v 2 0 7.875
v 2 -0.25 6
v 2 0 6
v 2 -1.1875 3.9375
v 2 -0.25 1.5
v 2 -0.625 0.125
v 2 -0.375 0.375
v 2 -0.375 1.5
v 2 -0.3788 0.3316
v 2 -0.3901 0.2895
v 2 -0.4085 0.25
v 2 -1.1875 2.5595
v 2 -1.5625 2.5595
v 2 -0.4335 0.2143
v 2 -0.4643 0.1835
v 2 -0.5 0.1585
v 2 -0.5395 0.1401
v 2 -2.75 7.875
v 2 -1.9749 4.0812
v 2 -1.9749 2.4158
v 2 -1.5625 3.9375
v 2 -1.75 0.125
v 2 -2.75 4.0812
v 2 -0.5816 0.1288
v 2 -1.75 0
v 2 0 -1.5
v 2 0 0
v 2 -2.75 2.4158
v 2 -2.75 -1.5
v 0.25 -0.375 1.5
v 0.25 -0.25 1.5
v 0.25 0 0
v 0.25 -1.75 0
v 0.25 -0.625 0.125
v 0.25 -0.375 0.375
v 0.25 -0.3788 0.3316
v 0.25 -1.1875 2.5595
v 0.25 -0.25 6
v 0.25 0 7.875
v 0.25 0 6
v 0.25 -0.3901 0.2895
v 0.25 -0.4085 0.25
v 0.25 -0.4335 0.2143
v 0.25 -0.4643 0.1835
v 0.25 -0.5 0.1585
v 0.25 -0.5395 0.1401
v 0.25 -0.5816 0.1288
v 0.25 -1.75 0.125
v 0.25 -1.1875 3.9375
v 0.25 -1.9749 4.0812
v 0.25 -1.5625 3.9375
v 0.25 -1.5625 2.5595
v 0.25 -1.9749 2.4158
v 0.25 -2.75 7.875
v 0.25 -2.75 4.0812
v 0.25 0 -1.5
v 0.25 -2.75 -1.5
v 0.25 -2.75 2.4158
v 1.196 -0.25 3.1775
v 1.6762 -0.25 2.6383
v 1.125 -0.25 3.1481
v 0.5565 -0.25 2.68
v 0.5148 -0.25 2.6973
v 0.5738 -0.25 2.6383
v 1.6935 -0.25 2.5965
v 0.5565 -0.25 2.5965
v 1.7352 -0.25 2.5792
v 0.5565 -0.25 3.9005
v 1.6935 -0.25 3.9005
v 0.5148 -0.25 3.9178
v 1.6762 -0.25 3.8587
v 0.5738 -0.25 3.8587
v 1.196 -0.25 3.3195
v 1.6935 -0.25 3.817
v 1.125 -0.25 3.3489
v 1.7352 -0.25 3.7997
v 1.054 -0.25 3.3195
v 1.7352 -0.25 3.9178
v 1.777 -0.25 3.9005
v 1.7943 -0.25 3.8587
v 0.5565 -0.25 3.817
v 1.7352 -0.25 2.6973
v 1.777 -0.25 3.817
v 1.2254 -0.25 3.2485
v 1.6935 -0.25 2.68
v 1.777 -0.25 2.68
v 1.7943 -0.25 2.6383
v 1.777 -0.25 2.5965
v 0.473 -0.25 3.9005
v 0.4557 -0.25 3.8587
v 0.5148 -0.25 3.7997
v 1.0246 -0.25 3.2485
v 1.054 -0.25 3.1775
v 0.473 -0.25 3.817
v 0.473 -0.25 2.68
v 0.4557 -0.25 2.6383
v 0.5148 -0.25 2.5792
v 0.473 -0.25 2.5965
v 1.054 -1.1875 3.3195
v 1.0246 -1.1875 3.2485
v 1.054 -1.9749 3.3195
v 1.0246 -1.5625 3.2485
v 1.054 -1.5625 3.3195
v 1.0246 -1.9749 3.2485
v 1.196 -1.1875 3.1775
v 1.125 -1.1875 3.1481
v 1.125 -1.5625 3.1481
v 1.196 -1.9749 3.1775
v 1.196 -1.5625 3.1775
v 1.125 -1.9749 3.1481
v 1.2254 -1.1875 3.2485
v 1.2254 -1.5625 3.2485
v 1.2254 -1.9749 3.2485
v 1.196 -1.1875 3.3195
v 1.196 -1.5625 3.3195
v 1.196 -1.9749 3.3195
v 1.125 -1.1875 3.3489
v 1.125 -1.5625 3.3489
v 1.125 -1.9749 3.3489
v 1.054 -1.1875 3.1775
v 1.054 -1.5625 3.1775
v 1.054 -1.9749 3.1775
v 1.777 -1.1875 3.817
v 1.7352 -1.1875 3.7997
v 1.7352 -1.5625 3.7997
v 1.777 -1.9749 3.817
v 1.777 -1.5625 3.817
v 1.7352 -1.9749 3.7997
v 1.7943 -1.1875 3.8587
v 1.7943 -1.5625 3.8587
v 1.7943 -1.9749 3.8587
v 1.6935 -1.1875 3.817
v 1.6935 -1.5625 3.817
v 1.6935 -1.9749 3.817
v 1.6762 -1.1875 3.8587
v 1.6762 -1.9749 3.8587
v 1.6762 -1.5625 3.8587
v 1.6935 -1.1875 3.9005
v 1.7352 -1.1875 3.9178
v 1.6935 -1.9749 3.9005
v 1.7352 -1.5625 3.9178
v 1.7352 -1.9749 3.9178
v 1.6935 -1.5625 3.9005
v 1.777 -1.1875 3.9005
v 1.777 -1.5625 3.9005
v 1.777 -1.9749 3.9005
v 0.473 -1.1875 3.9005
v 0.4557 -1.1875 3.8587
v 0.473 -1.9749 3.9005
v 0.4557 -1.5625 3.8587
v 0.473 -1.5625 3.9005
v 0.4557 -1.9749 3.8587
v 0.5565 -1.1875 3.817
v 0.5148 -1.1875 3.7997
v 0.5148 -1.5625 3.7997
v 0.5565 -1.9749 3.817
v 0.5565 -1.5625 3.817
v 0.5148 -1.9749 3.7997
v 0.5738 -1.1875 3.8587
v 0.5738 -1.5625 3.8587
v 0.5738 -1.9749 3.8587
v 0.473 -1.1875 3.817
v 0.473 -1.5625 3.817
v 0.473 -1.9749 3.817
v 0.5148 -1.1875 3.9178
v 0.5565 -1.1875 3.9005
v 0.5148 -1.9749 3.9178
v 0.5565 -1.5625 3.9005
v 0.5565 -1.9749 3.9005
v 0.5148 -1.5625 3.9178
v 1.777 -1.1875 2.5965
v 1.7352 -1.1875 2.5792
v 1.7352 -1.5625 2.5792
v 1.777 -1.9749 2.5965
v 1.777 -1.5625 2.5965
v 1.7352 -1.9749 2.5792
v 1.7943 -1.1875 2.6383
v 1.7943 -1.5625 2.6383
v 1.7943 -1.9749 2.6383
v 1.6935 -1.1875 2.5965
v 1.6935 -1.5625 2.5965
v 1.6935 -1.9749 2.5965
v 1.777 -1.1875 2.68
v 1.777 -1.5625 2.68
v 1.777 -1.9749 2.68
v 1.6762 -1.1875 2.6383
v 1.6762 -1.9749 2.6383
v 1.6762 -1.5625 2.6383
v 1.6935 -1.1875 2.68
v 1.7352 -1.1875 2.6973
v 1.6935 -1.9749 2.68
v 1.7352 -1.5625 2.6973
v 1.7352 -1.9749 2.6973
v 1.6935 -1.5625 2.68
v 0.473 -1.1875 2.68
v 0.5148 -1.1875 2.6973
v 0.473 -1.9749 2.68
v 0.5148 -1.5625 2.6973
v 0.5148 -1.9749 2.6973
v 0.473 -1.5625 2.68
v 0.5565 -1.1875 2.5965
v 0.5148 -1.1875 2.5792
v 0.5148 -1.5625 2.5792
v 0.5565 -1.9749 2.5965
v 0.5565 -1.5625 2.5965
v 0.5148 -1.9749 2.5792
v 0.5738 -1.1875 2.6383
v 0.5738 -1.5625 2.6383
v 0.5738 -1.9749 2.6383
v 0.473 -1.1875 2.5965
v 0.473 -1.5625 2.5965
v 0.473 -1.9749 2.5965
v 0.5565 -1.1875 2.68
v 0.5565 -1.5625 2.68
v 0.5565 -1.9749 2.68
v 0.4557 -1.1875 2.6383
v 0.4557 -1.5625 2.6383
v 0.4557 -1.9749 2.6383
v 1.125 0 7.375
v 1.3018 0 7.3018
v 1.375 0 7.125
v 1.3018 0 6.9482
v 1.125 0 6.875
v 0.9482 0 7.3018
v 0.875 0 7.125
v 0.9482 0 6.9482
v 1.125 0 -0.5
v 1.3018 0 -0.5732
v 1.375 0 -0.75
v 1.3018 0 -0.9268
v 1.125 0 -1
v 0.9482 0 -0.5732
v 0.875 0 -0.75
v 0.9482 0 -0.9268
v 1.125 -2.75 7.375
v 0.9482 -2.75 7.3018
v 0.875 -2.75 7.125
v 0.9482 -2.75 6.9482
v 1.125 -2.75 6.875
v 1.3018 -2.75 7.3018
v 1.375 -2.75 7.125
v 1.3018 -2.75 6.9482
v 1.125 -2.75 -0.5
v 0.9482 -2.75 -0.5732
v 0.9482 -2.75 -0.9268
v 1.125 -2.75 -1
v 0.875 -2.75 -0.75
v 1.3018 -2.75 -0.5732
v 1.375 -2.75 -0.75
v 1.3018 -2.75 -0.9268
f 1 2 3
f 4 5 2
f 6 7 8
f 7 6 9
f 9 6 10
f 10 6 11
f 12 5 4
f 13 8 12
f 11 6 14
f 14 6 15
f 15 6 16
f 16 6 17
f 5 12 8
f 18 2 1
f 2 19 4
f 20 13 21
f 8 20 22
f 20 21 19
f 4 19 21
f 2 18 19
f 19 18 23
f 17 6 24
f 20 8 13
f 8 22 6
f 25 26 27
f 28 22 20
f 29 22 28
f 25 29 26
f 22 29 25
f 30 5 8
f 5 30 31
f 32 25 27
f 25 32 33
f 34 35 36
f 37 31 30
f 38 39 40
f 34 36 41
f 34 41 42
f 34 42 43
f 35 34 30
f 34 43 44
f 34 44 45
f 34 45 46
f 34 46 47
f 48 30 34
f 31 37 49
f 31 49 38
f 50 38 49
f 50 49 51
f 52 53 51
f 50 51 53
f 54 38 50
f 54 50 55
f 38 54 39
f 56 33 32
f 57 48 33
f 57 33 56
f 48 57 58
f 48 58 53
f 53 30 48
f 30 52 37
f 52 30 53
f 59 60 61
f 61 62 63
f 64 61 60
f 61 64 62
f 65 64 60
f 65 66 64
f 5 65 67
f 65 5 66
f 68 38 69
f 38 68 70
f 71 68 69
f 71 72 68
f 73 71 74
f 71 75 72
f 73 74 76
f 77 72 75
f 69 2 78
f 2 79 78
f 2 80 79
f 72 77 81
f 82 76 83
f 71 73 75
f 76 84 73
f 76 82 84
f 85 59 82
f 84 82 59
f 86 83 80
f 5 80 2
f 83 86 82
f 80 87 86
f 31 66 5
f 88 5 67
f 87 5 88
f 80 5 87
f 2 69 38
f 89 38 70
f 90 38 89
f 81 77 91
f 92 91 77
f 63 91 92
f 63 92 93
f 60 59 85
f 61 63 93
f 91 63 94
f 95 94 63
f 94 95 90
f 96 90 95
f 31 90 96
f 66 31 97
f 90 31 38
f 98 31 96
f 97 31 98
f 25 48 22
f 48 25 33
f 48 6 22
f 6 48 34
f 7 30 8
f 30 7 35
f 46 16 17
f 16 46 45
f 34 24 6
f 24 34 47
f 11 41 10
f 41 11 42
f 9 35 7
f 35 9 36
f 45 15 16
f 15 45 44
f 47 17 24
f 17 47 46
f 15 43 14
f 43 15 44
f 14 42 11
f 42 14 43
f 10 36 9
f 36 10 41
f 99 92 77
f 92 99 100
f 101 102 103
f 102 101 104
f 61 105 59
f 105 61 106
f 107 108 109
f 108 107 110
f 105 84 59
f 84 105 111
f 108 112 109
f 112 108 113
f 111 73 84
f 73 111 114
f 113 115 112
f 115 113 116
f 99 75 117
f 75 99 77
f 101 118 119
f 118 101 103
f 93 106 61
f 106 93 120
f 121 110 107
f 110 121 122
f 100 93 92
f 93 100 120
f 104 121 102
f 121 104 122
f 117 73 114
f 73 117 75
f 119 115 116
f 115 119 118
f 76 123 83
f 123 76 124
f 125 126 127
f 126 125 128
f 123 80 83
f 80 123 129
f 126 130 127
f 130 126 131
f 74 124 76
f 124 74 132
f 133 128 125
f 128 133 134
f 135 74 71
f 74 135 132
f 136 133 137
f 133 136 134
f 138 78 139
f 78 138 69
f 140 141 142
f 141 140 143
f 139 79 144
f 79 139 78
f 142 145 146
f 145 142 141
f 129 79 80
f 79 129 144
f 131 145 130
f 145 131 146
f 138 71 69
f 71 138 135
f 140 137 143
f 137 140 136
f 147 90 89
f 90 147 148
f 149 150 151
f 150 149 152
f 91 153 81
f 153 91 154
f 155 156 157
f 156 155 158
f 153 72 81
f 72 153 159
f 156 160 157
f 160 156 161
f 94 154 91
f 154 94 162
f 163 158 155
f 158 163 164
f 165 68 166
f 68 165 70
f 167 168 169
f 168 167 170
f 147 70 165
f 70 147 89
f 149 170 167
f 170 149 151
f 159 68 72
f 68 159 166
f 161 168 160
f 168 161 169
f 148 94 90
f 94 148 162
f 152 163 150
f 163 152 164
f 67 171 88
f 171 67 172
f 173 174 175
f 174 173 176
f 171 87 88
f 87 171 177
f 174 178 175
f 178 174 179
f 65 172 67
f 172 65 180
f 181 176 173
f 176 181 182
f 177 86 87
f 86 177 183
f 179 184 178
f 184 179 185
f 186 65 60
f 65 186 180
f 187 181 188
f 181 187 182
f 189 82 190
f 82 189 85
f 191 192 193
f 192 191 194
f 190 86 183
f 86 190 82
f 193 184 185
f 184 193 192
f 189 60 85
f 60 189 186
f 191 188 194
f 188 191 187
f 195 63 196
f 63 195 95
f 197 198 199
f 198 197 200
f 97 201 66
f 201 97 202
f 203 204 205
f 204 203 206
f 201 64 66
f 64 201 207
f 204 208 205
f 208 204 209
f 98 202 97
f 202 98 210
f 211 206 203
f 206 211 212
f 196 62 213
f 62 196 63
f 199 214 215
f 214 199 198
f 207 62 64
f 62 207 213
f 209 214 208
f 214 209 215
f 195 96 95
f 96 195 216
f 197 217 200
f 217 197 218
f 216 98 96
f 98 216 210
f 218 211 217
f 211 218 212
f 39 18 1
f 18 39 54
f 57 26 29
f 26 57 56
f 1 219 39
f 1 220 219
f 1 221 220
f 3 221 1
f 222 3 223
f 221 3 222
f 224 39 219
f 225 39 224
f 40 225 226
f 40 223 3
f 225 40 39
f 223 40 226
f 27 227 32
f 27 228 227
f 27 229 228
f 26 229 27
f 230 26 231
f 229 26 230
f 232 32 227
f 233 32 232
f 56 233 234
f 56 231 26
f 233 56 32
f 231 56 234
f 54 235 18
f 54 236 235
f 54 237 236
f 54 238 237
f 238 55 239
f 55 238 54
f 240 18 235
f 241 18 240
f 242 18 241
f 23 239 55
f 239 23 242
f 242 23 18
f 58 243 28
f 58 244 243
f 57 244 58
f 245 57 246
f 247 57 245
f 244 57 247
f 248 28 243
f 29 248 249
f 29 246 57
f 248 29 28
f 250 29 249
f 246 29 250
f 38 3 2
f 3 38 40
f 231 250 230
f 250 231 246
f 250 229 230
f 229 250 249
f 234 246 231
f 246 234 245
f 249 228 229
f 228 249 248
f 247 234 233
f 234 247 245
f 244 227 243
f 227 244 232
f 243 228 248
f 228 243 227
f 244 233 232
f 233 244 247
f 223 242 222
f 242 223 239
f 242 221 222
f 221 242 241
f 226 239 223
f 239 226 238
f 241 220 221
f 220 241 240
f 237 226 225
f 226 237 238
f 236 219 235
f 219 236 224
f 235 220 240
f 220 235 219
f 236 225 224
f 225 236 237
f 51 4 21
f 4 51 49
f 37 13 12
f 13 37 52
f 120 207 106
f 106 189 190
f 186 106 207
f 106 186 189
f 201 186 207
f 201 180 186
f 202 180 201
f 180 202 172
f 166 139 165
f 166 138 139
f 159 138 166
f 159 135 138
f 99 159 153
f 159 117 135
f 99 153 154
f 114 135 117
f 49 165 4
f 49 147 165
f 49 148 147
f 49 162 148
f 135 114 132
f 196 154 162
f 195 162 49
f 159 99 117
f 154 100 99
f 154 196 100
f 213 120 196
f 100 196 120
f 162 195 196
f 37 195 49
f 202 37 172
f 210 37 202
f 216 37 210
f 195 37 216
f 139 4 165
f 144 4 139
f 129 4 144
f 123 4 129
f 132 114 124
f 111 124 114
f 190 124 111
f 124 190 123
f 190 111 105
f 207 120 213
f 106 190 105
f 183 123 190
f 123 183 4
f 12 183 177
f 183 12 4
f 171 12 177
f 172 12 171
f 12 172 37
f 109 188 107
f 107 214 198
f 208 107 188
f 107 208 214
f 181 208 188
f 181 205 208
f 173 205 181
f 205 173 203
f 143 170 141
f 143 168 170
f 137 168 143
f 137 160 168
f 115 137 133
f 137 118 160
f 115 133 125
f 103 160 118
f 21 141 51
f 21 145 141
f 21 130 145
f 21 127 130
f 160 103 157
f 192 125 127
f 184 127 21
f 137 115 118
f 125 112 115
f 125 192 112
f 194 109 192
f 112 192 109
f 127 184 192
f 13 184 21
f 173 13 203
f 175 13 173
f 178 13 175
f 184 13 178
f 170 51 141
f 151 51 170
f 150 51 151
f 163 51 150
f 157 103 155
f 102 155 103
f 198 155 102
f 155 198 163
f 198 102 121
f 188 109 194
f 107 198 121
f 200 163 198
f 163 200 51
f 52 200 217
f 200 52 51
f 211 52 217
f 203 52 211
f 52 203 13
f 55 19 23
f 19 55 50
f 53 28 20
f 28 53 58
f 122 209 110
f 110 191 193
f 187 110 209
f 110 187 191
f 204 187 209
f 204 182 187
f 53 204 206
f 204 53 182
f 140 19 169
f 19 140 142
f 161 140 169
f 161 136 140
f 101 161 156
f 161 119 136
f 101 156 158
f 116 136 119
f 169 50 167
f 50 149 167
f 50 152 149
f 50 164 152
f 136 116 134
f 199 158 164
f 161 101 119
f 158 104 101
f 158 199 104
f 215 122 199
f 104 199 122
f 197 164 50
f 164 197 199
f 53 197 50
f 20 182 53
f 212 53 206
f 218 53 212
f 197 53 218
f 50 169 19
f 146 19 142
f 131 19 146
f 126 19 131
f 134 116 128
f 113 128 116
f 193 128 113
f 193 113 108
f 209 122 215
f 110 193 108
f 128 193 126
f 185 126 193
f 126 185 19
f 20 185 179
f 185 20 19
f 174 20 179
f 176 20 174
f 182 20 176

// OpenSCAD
// file: TTvars.scad
$fn=8; //default 36

//flat bar
barX=0.25;
barZ=6;
barLY=108;
barLX=60;

//angle iron
angX=1.5;
angT=0.125;
angLY=barLY;
angLX=barLX;
angR=0.25;

//square tubing
cornerSQ=1.5; //size of square tubing in corners
cornerSQr=0.125; //radius of square tubing 90s
cornerT=0.5; //thickness of corner mount walls
cornerBoltOD=0.5;

boltD=0.5;   // 6mm
boltL=1.968504;    // 50mm

brrOD=0.875;
brrID=0.375;
brrT=0.28125;

sprOD=0.25; //spring? i dont remember wha this is

bmountGap=0.125;
bmountbrrGap=0.125;

//stepper
stepBoltD=0.11811024;  //3.0mm bolt diameter
stepBoltHD=0.22362205; //5.68mm head diameter
stepBoltHH=0.11811024;  //3.0mm head height
stepBoltX=1.22047244;   //31.0mm square from bolt center to center
stepBoltIn=0.15748031;  //4.0mm bolt depth into stepper
stepSeatD=0.86614173;    //22.0mm
stepSeatH=0.07874016;    //2.0mm
stepX=1.66535433;        //42.3mm stepper square face 
stepBoreD=0.2007874;     //5.1mm shaft bore
stepBoreL=0.787402;    //20mm

//pully
pullP=1.253;       //OD of belt around pully GT2 20T ??
pullH=0.25;            //Height of pulley ?????
pullS=0.125;           //pully space

//calculated

Y2Y=barLX+0.0;
Y2YA=Y2Y+(((((barX+(bmountGap*2)))/2)+0.5)*2); //center to center barL
X2X=8; //distance between X rails

bmountX=max((barX+(bmountGap*2)+(stepX*2)),(barX+((brrOD+1)*2)));
// max(barX+(bmountGap*2)+(stepX*2),barX+((brrOD+1)*2))
bmountY=X2X;
bmountZ=barZ+(1+boltD)+(brrOD/2)+(brrID/2)+(0.25)+boltD+(0.5);

xmountX=((bmountX-(barX+(bmountGap*2)))/2)+0;
xmountY=angX+barX+1.0;
// main file
include <TTvars.scad>;

TTxmount();

//todo
//need to add stepper motor mounting holes or idler
///can stepper and idler be interchangeable?
//set screw hole and nut holder

module TTxmount(){
translate([(barX+(bmountGap*2))/2,-xmountY,-(1+boltD)]){    
difference(){
cube([xmountX,xmountY,bmountZ]);    
//main flat bar cutout
    translate([0,xmountY-barX,(1+boltD)])
cube([xmountX,barX,barZ]);

//angle iron
translate([0,xmountY-angX-barX,(1+boltD)])
difference(){
    cube([xmountX,angX,angX]);
    translate([0,-angT,angT])
    cube([xmountX,angX,angX]);
}
translate([0,xmountY-barX-angX,(1+boltD)])
translate([0,angX-angR-angT,angT])
difference(){
cube([xmountX,angR,angR]);
    translate([0,0,angR])
    rotate([0,90,0])
    cylinder(r=angR,h=xmountX,$fn=36);
} //end difference    
//end angle iron

//main mounting holes
translate([bmountX-(((bmountX-(barX+(bmountGap*2)))/2)/2)-(bmountX/2)-((barX/2)+bmountGap),0,(1+boltD)/2])
rotate([-90,0,0])
    cylinder(d=boltD, h=xmountY);
translate([bmountX-(((bmountX-(barX+(bmountGap*2)))/2)/2)-(bmountX/2)-((barX/2)+bmountGap),0,barZ+(brrOD/2)+(brrID/2)+(0.25)+(boltD/2)+(1+boltD)])
rotate([-90,0,0])
    cylinder(d=boltD, h=xmountY);
    
///////stepper

//pully hole
translate([xmountX/2,xmountY-barX-(barX/2)-bmountGap-(bmountX-(((bmountX-(barX+(bmountGap*2)))/2)/2)-(bmountX/2)-((barX/2)+bmountGap)),(1+boltD)+((bmountZ-(1+boltD))/2)-((pullP+pullS)/2)])
cube([xmountX,pullH+pullS,pullP+pullS], center=true);

//stepper face mount
translate([xmountX/2,xmountY-barX-(barX/2)-bmountGap-(bmountX-(((bmountX-(barX+(bmountGap*2)))/2)/2)-(bmountX/2)-((barX/2)+bmountGap))-(xmountY/2)+((pullH+pullS)/2)-stepBoreL,(1+boltD)+((bmountZ-(1+boltD))/2)-((pullP+pullS)/2)])
cube([xmountX,xmountY,stepX], center=true); // should X= xmountX or stepX?


translate([xmountX/2,0,(1+boltD)+((bmountZ-(1+boltD))/2)-((pullP+pullS)/2)]){
////bore
translate([0,0,0])
rotate([270,0,0])
cylinder(d=stepBoreD,h=xmountY);


//translate([bmountX-(((bmountX-(barX+(bmountGap*2)))/2)/2)-(bmountX/2),-(angX+0.75),barZ/2])
    
//cylinder(d=pullP,h=angX+0.75);

////seat
translate([0,0,0])
rotate([270,0,0])
cylinder(d=stepSeatD,h=stepSeatH);

////setpper mount holes
translate([(stepBoltX/2),0,(stepBoltX/2)])
rotate([270,0,0])
cylinder(d=stepBoltD,h=xmountY);
translate([-(stepBoltX/2),0,(stepBoltX/2)])
rotate([270,0,0])
cylinder(d=stepBoltD,h=xmountY);
translate([(stepBoltX/2),0,-(stepBoltX/2)])
rotate([270,0,0])
cylinder(d=stepBoltD,h=xmountY);
translate([-(stepBoltX/2),0,-(stepBoltX/2)])
rotate([270,0,0])
cylinder(d=stepBoltD,h=xmountY);
}

} //end difference
} //end translate
} //end TTxmount
